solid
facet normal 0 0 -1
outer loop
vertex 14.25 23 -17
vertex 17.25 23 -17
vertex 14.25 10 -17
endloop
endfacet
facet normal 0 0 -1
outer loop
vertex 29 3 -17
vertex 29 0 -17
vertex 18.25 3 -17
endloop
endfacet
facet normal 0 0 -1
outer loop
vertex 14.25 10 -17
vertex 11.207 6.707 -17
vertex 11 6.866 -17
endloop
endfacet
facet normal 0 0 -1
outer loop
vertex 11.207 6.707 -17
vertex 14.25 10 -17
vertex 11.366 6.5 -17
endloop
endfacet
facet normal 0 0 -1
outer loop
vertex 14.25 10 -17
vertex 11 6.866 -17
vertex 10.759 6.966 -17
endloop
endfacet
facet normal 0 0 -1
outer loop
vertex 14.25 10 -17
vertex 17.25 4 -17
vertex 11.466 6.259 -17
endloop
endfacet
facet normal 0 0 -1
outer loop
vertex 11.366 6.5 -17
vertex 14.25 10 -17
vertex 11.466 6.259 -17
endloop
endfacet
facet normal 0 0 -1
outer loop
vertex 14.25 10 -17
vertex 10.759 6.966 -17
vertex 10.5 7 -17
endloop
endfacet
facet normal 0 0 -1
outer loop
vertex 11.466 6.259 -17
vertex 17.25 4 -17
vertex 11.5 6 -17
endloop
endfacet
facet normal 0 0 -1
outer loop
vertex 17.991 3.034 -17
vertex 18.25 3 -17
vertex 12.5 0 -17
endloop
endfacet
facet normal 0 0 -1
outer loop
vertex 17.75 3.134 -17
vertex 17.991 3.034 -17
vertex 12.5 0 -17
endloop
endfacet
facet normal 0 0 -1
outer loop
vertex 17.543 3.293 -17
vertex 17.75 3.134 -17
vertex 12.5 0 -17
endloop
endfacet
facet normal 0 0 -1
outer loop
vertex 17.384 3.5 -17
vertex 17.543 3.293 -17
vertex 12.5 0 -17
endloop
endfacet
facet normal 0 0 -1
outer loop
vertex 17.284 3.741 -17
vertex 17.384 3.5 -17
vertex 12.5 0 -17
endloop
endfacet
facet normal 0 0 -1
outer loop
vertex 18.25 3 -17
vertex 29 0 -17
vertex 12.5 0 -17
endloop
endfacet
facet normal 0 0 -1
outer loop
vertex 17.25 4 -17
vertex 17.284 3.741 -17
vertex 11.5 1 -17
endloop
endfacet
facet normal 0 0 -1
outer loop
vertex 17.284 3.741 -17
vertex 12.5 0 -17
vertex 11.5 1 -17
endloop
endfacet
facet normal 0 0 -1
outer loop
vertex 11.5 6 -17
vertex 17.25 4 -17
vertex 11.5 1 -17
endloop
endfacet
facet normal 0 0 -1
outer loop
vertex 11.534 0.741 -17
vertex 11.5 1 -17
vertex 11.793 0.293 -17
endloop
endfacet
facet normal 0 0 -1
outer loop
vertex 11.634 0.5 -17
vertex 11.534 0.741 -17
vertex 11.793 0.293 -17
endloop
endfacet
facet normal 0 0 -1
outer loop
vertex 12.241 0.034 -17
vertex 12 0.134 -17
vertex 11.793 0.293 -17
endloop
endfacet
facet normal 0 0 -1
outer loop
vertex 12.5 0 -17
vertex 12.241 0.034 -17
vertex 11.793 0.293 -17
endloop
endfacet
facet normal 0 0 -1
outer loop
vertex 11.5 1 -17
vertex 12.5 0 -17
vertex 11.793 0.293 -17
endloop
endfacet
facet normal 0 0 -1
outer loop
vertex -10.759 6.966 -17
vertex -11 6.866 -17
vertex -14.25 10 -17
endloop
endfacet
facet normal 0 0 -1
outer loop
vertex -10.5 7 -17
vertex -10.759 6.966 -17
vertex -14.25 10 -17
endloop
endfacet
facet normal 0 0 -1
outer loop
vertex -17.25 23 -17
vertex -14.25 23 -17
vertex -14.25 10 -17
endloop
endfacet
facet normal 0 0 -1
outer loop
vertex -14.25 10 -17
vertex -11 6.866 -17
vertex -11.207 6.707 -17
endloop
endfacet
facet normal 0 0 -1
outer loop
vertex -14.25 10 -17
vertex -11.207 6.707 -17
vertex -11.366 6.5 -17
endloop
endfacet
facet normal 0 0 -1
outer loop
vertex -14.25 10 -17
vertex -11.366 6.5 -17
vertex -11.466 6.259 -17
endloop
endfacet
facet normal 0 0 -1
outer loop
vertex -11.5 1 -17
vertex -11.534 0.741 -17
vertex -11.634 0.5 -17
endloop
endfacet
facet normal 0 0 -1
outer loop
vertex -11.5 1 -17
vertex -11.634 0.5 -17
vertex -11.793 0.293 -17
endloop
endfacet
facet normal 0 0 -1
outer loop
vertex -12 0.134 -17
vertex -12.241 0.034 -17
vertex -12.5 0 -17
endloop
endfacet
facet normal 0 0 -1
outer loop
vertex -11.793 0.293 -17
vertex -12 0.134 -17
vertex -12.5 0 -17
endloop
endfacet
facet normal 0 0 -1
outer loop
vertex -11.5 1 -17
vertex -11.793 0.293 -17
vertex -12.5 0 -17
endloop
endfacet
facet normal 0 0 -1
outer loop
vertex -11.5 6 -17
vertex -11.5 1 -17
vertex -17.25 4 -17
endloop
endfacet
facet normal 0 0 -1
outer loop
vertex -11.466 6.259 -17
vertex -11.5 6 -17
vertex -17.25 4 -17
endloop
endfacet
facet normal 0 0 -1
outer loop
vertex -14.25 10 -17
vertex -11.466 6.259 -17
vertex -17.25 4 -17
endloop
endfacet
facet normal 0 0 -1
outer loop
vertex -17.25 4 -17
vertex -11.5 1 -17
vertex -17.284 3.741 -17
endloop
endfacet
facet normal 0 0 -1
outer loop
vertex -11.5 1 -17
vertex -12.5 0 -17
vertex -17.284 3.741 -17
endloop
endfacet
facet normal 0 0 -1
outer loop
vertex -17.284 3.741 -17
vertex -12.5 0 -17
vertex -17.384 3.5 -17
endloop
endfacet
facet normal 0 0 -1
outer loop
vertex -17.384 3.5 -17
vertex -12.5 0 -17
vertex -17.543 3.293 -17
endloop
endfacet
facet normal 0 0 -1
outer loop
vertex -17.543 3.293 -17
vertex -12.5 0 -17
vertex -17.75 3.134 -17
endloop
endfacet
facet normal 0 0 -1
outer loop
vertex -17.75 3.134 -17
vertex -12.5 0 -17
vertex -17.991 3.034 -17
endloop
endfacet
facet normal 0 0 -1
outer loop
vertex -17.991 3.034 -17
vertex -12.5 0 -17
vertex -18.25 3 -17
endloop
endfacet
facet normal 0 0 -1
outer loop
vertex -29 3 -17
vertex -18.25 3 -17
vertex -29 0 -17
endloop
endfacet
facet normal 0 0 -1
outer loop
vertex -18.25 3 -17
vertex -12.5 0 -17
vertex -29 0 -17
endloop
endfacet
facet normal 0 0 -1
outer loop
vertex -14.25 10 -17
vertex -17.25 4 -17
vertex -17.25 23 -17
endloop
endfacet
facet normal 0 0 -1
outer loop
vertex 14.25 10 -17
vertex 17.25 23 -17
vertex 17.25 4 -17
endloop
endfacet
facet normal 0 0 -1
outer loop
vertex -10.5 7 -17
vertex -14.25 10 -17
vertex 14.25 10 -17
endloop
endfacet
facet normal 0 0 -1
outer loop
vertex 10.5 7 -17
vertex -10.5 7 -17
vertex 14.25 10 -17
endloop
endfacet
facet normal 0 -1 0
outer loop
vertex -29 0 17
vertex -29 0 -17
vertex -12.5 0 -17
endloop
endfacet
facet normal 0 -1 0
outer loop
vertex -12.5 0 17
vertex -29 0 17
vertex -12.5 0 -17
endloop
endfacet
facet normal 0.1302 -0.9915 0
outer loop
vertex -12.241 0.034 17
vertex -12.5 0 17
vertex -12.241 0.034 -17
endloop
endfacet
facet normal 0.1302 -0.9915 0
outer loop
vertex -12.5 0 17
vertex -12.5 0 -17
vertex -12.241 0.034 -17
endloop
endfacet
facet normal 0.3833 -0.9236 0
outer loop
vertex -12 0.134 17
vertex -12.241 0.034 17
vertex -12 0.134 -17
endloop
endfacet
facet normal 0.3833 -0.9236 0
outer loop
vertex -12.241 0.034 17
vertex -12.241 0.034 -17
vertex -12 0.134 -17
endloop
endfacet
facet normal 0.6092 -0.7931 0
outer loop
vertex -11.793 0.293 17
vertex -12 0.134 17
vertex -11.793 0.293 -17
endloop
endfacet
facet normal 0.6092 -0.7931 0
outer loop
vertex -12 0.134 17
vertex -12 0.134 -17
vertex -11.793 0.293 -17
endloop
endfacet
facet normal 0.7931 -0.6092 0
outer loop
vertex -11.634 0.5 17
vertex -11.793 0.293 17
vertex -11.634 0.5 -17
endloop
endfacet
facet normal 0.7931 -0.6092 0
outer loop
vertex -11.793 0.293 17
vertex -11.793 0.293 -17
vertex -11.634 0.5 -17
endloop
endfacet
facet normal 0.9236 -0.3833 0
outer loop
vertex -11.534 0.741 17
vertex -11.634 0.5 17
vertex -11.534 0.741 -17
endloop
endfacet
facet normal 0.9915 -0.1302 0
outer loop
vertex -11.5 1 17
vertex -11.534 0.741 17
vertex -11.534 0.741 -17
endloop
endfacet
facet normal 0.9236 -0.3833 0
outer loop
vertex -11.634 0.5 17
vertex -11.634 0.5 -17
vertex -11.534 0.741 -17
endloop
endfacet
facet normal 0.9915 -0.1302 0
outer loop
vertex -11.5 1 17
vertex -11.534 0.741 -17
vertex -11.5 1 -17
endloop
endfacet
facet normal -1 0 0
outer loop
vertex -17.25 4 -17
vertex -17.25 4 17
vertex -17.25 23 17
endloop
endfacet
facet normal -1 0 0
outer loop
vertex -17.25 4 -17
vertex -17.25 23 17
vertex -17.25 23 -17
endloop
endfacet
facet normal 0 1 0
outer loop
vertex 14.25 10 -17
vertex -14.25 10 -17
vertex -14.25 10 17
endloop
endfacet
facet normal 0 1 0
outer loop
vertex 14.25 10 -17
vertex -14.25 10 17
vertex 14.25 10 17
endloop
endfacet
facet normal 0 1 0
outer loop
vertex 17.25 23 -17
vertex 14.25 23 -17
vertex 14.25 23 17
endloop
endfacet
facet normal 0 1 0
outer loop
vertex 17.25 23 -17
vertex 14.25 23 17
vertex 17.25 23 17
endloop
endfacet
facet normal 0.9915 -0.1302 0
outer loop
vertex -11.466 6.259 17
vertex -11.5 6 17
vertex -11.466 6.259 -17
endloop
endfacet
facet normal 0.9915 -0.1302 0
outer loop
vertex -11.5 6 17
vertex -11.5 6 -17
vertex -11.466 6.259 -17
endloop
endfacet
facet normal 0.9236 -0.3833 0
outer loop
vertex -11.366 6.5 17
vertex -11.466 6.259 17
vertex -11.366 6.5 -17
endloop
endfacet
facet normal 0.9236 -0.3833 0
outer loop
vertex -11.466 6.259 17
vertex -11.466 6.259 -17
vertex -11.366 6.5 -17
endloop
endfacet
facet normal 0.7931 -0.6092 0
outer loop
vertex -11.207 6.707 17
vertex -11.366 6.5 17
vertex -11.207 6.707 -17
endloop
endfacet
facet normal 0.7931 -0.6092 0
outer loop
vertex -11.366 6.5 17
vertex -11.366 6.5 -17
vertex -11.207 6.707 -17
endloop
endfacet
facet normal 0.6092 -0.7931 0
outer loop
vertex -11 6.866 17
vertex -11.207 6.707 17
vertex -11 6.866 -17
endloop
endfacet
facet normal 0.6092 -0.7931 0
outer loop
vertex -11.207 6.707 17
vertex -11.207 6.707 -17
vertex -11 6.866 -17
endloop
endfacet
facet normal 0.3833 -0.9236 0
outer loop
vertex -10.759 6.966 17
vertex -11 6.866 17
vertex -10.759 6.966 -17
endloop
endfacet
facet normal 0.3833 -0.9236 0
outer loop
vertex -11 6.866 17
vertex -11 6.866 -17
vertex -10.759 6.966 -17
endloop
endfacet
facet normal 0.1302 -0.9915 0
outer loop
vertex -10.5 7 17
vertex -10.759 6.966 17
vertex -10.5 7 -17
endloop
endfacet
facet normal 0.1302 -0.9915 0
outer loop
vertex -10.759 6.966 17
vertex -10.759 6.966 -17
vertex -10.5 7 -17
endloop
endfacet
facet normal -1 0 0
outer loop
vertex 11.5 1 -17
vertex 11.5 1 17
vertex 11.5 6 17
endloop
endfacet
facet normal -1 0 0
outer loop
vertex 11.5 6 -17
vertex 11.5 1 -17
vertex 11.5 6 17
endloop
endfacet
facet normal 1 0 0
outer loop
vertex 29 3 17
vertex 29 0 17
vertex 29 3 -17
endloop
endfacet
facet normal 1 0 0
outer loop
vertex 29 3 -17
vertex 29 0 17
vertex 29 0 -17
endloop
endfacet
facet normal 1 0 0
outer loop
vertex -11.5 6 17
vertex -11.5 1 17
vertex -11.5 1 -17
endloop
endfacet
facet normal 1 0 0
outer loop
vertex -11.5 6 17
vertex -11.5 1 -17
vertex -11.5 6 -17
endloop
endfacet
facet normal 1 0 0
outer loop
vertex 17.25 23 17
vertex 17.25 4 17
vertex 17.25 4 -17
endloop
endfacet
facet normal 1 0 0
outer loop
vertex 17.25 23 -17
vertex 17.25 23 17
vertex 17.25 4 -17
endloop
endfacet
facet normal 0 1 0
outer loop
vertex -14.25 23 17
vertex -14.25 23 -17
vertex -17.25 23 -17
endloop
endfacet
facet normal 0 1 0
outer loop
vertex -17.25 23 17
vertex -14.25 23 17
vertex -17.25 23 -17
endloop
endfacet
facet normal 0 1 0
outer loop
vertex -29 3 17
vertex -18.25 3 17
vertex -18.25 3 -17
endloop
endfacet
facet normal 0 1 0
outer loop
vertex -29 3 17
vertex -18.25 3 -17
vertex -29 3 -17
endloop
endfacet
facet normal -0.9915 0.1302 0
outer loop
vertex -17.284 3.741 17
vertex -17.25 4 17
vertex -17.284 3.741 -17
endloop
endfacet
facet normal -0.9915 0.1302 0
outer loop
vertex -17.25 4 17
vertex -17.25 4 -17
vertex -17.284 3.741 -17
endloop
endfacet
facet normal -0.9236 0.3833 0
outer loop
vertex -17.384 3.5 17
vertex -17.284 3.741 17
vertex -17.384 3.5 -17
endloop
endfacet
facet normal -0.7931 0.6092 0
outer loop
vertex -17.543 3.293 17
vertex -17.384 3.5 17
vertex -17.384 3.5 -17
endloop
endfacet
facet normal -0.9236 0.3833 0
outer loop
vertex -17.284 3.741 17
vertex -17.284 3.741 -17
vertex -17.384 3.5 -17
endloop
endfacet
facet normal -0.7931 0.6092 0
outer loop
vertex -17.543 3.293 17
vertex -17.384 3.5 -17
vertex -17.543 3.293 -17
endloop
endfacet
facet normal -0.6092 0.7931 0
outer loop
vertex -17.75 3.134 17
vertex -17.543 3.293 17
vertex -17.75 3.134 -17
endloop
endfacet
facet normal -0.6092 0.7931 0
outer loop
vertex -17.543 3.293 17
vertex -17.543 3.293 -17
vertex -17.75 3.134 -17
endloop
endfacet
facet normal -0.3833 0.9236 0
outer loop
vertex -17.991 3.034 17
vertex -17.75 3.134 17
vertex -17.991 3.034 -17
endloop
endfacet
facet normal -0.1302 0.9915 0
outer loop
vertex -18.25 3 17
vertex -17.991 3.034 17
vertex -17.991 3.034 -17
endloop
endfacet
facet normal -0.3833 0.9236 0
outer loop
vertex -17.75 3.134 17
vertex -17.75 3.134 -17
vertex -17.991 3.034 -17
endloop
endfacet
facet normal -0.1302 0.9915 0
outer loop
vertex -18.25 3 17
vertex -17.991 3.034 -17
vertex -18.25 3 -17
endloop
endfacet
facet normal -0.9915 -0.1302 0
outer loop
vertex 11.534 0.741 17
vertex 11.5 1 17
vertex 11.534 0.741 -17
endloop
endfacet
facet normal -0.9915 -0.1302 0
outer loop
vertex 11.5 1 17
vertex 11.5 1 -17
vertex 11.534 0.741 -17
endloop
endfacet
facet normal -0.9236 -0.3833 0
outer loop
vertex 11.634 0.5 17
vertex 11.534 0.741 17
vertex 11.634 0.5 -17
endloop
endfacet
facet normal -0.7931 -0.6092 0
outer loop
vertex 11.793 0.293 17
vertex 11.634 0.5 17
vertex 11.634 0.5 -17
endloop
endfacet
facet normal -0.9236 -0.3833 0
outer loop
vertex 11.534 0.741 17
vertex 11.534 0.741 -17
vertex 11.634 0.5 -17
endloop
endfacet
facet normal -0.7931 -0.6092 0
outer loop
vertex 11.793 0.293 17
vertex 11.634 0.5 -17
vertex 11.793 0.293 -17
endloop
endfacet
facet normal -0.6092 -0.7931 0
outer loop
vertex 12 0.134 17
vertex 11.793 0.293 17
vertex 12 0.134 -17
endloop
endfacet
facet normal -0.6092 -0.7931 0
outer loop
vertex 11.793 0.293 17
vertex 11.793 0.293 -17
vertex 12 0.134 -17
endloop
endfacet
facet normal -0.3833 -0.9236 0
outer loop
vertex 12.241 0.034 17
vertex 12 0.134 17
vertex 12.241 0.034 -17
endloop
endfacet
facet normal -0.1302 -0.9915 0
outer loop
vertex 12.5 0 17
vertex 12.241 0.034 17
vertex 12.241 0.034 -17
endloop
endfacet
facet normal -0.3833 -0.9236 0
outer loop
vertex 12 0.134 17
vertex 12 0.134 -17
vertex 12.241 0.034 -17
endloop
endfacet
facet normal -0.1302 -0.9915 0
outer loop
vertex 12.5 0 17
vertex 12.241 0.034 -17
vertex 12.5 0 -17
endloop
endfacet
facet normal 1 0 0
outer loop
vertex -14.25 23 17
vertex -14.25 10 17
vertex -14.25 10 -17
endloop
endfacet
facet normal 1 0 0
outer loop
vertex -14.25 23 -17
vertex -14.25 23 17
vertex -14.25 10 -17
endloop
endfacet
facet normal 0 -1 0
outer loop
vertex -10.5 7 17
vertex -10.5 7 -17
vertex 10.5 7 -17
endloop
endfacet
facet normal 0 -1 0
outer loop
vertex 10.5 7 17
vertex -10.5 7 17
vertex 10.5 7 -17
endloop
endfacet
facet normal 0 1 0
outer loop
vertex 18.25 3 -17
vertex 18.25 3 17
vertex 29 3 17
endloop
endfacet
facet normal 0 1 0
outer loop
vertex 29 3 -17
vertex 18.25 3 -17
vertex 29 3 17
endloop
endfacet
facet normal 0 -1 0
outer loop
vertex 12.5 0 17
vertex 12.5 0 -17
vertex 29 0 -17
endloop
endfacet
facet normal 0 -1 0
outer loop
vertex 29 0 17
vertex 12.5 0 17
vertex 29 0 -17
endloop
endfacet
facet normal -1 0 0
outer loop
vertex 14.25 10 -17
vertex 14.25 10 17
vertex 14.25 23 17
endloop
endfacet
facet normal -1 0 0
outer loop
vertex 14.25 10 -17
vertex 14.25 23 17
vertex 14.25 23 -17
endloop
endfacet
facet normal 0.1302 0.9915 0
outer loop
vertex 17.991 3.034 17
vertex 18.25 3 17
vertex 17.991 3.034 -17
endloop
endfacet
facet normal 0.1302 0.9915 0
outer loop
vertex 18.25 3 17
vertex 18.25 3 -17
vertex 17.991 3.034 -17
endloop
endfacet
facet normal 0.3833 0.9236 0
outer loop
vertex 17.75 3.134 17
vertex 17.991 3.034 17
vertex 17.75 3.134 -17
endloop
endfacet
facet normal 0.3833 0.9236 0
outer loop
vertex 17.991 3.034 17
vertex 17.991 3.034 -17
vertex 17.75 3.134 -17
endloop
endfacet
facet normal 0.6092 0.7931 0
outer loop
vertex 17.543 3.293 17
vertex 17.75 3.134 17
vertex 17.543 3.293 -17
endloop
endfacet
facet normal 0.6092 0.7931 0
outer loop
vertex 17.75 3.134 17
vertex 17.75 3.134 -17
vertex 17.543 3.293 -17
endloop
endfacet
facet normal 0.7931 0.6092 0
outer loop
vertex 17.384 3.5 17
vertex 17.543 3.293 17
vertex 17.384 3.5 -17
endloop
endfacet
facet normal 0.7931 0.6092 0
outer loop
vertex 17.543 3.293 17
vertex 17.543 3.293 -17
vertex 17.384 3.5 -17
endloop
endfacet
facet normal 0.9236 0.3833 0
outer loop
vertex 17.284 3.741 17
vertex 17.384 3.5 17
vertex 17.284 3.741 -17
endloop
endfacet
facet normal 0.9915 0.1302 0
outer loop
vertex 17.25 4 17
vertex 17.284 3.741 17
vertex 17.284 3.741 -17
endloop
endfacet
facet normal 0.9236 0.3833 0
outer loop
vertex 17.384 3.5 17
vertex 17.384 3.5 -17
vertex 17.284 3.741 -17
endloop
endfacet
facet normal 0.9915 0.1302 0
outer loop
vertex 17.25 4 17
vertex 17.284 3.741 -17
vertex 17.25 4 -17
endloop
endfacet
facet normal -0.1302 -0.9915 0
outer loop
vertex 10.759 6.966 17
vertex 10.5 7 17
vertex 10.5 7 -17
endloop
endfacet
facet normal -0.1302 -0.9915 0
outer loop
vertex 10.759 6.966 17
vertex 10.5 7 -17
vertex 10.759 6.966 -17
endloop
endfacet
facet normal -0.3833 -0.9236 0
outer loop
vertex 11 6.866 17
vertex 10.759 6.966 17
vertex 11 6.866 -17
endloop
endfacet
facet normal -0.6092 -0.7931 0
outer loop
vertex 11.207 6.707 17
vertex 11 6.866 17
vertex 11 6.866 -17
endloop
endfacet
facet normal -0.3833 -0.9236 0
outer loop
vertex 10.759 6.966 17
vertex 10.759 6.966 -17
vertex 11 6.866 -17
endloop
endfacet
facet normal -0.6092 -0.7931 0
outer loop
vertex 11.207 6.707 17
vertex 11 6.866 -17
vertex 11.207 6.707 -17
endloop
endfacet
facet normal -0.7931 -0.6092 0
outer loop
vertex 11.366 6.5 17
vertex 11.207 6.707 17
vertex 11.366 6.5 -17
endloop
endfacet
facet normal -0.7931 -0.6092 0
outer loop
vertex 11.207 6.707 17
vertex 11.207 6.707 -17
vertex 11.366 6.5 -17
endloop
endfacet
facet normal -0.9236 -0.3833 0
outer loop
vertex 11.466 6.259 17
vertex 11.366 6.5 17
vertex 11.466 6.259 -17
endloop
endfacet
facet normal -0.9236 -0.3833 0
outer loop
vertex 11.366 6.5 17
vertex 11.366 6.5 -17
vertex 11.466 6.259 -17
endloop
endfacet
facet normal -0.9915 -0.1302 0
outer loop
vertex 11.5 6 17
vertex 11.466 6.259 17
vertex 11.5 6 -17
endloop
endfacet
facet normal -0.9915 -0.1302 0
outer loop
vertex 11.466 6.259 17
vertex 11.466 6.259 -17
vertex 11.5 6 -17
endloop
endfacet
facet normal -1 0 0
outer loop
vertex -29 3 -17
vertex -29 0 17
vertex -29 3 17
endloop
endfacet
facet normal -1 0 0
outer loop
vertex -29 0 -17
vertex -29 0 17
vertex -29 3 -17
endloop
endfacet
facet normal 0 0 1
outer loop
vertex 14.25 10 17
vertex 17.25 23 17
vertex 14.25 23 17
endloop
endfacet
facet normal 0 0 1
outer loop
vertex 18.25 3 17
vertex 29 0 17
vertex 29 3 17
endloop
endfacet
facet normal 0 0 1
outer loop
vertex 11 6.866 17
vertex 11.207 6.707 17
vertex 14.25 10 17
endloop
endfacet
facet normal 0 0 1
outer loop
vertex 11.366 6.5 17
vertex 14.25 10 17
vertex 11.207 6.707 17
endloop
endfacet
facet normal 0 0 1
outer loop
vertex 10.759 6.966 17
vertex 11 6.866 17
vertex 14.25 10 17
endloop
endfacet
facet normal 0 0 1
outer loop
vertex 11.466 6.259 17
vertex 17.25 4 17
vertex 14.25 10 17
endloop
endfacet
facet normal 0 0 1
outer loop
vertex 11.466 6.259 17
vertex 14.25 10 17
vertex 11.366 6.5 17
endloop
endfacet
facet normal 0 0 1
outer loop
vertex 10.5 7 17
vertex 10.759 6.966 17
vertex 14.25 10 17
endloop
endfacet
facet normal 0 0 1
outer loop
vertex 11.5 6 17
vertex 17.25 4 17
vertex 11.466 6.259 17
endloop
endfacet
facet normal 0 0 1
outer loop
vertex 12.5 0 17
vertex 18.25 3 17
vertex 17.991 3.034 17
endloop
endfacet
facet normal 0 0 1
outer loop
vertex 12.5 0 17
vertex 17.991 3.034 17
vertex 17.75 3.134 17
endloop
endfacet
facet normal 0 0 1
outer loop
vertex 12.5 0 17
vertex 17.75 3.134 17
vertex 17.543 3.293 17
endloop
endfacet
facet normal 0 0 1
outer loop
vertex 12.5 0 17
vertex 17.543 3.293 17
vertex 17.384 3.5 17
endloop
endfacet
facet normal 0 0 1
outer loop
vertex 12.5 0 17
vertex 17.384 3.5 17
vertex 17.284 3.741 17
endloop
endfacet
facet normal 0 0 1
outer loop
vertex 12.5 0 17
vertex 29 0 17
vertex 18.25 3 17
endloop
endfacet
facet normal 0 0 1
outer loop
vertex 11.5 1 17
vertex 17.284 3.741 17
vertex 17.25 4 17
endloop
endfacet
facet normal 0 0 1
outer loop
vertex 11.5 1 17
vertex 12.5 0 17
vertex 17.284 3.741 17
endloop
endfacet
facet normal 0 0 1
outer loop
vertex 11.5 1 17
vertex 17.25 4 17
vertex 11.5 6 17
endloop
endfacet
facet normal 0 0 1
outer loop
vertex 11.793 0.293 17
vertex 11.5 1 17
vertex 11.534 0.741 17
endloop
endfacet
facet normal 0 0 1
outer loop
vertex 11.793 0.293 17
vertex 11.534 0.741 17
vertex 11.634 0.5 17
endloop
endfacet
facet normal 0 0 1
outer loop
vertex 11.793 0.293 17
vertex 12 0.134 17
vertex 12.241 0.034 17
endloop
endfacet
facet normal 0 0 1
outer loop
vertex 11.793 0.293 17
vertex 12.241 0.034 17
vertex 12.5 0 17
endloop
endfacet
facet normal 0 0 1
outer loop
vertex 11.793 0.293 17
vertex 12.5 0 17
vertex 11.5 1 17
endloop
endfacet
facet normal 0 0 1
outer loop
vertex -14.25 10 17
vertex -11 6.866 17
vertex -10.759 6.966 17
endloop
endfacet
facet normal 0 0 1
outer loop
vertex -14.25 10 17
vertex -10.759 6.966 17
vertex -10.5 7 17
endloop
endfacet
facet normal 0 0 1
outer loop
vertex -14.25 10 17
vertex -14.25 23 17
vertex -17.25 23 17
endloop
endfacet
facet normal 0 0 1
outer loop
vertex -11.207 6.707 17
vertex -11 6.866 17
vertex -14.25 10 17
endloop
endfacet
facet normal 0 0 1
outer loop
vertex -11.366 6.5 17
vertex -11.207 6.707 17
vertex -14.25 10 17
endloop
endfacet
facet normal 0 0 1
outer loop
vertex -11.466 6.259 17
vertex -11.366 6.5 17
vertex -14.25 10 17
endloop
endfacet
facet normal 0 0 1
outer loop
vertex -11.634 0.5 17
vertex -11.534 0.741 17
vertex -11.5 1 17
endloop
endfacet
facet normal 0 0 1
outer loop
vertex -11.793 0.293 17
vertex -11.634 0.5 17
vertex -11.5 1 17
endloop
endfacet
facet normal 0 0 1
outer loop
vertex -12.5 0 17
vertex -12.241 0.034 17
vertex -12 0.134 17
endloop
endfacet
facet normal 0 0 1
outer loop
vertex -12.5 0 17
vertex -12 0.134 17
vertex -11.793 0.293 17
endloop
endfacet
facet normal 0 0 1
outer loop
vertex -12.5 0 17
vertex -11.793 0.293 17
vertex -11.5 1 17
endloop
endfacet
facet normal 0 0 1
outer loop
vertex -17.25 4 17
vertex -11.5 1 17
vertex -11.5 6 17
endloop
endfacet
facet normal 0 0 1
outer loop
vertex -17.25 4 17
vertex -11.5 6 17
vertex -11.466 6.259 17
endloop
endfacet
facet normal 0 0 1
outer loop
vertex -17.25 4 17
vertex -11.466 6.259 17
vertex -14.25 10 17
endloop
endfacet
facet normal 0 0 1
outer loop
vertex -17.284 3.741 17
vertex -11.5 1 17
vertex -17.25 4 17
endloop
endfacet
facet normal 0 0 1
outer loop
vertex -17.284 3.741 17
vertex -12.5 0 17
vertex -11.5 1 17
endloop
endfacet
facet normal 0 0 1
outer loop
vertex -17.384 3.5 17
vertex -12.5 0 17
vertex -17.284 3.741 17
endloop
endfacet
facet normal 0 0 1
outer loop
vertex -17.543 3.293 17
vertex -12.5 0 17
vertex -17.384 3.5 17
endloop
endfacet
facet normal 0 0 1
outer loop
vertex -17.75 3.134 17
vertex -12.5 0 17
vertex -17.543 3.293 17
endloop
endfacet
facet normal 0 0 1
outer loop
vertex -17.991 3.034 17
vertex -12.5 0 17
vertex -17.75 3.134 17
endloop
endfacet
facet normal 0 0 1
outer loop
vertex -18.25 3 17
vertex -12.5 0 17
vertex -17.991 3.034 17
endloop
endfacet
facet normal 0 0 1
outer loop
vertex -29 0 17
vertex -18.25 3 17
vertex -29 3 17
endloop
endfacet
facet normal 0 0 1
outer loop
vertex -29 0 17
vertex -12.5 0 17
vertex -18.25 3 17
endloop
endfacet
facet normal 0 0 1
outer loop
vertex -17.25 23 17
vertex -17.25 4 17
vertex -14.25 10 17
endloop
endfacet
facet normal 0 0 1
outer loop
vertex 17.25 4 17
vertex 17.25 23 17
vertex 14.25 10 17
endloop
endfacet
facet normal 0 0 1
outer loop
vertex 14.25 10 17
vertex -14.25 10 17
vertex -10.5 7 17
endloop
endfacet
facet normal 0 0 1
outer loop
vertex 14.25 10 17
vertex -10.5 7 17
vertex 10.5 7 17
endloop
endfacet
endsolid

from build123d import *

# Parameters (mm, degrees)
SKETCH1_W           = 58
SKETCH1_H           = 34
BOSS_EXTRUDE1_DEPTH = 10
SKETCH3_W           = 23
SKETCH3_H           = 7
CUT_EXTRUDE1_DEPTH  = 34
SKETCH4_W           = 11.75
SKETCH4_H           = 7
CUT_EXTRUDE2_DEPTH  = 34
SKETCH6_W           = 3
SKETCH6_H           = 34
BOSS_EXTRUDE2_DEPTH = 13
FILLET1_R           = 1


with BuildPart() as part:
    # Sketch1 → Boss-Extrude1 (new body)
    with BuildSketch(Plane(origin=(0, 0, 0), x_dir=(1, 0, 0), z_dir=(0, 1, 0))):
        Rectangle(SKETCH1_W, SKETCH1_H)
    extrude(amount=BOSS_EXTRUDE1_DEPTH)

    # Sketch3 → Cut-Extrude1 (cut)
    with BuildSketch(Plane.XY.offset(17)):
        with Locations((0, 3.5)):
            Rectangle(SKETCH3_W, SKETCH3_H)
    extrude(amount=-CUT_EXTRUDE1_DEPTH, mode=Mode.SUBTRACT)

    # Sketch4 → Cut-Extrude2 (cut)
    with BuildSketch(Plane.XY.offset(17)):
        with Locations((23.125, 6.5)):
            Rectangle(SKETCH4_W, SKETCH4_H)
    cut_extrude2 = extrude(amount=-CUT_EXTRUDE2_DEPTH, mode=Mode.SUBTRACT)

    # Mirror1: Cut-Extrude2 across plane
    add(cut_extrude2.mirror(Plane(origin=(0, 0, 0), x_dir=(0, 0, 1), z_dir=(1, 0, 0))), mode=Mode.SUBTRACT)

    # Sketch6 → Boss-Extrude2 (add)
    with BuildSketch(Plane(origin=(0, 10, 0), x_dir=(1, 0, 0), z_dir=(0, 1, 0))):
        with Locations((15.75, 0)):
            Rectangle(SKETCH6_W, SKETCH6_H)
    boss_extrude2 = extrude(amount=BOSS_EXTRUDE2_DEPTH)

    # Mirror2: Boss-Extrude2 across plane
    add(boss_extrude2.mirror(Plane(origin=(0, 0, 0), x_dir=(0, 0, 1), z_dir=(1, 0, 0))))

    # Fillet1
    fillet1_edges = [part.edges().sort_by_distance(p)[0] for p in [
        (-11.5, 0, 0),
        (-11.5, 7, 0),
        (11.5, 7, 0),
        (11.5, 0, 0),
        (17.25, 3, 0),
        (-17.25, 3, 0),
    ]]
    fillet(fillet1_edges, radius=FILLET1_R)


solid = part.part
